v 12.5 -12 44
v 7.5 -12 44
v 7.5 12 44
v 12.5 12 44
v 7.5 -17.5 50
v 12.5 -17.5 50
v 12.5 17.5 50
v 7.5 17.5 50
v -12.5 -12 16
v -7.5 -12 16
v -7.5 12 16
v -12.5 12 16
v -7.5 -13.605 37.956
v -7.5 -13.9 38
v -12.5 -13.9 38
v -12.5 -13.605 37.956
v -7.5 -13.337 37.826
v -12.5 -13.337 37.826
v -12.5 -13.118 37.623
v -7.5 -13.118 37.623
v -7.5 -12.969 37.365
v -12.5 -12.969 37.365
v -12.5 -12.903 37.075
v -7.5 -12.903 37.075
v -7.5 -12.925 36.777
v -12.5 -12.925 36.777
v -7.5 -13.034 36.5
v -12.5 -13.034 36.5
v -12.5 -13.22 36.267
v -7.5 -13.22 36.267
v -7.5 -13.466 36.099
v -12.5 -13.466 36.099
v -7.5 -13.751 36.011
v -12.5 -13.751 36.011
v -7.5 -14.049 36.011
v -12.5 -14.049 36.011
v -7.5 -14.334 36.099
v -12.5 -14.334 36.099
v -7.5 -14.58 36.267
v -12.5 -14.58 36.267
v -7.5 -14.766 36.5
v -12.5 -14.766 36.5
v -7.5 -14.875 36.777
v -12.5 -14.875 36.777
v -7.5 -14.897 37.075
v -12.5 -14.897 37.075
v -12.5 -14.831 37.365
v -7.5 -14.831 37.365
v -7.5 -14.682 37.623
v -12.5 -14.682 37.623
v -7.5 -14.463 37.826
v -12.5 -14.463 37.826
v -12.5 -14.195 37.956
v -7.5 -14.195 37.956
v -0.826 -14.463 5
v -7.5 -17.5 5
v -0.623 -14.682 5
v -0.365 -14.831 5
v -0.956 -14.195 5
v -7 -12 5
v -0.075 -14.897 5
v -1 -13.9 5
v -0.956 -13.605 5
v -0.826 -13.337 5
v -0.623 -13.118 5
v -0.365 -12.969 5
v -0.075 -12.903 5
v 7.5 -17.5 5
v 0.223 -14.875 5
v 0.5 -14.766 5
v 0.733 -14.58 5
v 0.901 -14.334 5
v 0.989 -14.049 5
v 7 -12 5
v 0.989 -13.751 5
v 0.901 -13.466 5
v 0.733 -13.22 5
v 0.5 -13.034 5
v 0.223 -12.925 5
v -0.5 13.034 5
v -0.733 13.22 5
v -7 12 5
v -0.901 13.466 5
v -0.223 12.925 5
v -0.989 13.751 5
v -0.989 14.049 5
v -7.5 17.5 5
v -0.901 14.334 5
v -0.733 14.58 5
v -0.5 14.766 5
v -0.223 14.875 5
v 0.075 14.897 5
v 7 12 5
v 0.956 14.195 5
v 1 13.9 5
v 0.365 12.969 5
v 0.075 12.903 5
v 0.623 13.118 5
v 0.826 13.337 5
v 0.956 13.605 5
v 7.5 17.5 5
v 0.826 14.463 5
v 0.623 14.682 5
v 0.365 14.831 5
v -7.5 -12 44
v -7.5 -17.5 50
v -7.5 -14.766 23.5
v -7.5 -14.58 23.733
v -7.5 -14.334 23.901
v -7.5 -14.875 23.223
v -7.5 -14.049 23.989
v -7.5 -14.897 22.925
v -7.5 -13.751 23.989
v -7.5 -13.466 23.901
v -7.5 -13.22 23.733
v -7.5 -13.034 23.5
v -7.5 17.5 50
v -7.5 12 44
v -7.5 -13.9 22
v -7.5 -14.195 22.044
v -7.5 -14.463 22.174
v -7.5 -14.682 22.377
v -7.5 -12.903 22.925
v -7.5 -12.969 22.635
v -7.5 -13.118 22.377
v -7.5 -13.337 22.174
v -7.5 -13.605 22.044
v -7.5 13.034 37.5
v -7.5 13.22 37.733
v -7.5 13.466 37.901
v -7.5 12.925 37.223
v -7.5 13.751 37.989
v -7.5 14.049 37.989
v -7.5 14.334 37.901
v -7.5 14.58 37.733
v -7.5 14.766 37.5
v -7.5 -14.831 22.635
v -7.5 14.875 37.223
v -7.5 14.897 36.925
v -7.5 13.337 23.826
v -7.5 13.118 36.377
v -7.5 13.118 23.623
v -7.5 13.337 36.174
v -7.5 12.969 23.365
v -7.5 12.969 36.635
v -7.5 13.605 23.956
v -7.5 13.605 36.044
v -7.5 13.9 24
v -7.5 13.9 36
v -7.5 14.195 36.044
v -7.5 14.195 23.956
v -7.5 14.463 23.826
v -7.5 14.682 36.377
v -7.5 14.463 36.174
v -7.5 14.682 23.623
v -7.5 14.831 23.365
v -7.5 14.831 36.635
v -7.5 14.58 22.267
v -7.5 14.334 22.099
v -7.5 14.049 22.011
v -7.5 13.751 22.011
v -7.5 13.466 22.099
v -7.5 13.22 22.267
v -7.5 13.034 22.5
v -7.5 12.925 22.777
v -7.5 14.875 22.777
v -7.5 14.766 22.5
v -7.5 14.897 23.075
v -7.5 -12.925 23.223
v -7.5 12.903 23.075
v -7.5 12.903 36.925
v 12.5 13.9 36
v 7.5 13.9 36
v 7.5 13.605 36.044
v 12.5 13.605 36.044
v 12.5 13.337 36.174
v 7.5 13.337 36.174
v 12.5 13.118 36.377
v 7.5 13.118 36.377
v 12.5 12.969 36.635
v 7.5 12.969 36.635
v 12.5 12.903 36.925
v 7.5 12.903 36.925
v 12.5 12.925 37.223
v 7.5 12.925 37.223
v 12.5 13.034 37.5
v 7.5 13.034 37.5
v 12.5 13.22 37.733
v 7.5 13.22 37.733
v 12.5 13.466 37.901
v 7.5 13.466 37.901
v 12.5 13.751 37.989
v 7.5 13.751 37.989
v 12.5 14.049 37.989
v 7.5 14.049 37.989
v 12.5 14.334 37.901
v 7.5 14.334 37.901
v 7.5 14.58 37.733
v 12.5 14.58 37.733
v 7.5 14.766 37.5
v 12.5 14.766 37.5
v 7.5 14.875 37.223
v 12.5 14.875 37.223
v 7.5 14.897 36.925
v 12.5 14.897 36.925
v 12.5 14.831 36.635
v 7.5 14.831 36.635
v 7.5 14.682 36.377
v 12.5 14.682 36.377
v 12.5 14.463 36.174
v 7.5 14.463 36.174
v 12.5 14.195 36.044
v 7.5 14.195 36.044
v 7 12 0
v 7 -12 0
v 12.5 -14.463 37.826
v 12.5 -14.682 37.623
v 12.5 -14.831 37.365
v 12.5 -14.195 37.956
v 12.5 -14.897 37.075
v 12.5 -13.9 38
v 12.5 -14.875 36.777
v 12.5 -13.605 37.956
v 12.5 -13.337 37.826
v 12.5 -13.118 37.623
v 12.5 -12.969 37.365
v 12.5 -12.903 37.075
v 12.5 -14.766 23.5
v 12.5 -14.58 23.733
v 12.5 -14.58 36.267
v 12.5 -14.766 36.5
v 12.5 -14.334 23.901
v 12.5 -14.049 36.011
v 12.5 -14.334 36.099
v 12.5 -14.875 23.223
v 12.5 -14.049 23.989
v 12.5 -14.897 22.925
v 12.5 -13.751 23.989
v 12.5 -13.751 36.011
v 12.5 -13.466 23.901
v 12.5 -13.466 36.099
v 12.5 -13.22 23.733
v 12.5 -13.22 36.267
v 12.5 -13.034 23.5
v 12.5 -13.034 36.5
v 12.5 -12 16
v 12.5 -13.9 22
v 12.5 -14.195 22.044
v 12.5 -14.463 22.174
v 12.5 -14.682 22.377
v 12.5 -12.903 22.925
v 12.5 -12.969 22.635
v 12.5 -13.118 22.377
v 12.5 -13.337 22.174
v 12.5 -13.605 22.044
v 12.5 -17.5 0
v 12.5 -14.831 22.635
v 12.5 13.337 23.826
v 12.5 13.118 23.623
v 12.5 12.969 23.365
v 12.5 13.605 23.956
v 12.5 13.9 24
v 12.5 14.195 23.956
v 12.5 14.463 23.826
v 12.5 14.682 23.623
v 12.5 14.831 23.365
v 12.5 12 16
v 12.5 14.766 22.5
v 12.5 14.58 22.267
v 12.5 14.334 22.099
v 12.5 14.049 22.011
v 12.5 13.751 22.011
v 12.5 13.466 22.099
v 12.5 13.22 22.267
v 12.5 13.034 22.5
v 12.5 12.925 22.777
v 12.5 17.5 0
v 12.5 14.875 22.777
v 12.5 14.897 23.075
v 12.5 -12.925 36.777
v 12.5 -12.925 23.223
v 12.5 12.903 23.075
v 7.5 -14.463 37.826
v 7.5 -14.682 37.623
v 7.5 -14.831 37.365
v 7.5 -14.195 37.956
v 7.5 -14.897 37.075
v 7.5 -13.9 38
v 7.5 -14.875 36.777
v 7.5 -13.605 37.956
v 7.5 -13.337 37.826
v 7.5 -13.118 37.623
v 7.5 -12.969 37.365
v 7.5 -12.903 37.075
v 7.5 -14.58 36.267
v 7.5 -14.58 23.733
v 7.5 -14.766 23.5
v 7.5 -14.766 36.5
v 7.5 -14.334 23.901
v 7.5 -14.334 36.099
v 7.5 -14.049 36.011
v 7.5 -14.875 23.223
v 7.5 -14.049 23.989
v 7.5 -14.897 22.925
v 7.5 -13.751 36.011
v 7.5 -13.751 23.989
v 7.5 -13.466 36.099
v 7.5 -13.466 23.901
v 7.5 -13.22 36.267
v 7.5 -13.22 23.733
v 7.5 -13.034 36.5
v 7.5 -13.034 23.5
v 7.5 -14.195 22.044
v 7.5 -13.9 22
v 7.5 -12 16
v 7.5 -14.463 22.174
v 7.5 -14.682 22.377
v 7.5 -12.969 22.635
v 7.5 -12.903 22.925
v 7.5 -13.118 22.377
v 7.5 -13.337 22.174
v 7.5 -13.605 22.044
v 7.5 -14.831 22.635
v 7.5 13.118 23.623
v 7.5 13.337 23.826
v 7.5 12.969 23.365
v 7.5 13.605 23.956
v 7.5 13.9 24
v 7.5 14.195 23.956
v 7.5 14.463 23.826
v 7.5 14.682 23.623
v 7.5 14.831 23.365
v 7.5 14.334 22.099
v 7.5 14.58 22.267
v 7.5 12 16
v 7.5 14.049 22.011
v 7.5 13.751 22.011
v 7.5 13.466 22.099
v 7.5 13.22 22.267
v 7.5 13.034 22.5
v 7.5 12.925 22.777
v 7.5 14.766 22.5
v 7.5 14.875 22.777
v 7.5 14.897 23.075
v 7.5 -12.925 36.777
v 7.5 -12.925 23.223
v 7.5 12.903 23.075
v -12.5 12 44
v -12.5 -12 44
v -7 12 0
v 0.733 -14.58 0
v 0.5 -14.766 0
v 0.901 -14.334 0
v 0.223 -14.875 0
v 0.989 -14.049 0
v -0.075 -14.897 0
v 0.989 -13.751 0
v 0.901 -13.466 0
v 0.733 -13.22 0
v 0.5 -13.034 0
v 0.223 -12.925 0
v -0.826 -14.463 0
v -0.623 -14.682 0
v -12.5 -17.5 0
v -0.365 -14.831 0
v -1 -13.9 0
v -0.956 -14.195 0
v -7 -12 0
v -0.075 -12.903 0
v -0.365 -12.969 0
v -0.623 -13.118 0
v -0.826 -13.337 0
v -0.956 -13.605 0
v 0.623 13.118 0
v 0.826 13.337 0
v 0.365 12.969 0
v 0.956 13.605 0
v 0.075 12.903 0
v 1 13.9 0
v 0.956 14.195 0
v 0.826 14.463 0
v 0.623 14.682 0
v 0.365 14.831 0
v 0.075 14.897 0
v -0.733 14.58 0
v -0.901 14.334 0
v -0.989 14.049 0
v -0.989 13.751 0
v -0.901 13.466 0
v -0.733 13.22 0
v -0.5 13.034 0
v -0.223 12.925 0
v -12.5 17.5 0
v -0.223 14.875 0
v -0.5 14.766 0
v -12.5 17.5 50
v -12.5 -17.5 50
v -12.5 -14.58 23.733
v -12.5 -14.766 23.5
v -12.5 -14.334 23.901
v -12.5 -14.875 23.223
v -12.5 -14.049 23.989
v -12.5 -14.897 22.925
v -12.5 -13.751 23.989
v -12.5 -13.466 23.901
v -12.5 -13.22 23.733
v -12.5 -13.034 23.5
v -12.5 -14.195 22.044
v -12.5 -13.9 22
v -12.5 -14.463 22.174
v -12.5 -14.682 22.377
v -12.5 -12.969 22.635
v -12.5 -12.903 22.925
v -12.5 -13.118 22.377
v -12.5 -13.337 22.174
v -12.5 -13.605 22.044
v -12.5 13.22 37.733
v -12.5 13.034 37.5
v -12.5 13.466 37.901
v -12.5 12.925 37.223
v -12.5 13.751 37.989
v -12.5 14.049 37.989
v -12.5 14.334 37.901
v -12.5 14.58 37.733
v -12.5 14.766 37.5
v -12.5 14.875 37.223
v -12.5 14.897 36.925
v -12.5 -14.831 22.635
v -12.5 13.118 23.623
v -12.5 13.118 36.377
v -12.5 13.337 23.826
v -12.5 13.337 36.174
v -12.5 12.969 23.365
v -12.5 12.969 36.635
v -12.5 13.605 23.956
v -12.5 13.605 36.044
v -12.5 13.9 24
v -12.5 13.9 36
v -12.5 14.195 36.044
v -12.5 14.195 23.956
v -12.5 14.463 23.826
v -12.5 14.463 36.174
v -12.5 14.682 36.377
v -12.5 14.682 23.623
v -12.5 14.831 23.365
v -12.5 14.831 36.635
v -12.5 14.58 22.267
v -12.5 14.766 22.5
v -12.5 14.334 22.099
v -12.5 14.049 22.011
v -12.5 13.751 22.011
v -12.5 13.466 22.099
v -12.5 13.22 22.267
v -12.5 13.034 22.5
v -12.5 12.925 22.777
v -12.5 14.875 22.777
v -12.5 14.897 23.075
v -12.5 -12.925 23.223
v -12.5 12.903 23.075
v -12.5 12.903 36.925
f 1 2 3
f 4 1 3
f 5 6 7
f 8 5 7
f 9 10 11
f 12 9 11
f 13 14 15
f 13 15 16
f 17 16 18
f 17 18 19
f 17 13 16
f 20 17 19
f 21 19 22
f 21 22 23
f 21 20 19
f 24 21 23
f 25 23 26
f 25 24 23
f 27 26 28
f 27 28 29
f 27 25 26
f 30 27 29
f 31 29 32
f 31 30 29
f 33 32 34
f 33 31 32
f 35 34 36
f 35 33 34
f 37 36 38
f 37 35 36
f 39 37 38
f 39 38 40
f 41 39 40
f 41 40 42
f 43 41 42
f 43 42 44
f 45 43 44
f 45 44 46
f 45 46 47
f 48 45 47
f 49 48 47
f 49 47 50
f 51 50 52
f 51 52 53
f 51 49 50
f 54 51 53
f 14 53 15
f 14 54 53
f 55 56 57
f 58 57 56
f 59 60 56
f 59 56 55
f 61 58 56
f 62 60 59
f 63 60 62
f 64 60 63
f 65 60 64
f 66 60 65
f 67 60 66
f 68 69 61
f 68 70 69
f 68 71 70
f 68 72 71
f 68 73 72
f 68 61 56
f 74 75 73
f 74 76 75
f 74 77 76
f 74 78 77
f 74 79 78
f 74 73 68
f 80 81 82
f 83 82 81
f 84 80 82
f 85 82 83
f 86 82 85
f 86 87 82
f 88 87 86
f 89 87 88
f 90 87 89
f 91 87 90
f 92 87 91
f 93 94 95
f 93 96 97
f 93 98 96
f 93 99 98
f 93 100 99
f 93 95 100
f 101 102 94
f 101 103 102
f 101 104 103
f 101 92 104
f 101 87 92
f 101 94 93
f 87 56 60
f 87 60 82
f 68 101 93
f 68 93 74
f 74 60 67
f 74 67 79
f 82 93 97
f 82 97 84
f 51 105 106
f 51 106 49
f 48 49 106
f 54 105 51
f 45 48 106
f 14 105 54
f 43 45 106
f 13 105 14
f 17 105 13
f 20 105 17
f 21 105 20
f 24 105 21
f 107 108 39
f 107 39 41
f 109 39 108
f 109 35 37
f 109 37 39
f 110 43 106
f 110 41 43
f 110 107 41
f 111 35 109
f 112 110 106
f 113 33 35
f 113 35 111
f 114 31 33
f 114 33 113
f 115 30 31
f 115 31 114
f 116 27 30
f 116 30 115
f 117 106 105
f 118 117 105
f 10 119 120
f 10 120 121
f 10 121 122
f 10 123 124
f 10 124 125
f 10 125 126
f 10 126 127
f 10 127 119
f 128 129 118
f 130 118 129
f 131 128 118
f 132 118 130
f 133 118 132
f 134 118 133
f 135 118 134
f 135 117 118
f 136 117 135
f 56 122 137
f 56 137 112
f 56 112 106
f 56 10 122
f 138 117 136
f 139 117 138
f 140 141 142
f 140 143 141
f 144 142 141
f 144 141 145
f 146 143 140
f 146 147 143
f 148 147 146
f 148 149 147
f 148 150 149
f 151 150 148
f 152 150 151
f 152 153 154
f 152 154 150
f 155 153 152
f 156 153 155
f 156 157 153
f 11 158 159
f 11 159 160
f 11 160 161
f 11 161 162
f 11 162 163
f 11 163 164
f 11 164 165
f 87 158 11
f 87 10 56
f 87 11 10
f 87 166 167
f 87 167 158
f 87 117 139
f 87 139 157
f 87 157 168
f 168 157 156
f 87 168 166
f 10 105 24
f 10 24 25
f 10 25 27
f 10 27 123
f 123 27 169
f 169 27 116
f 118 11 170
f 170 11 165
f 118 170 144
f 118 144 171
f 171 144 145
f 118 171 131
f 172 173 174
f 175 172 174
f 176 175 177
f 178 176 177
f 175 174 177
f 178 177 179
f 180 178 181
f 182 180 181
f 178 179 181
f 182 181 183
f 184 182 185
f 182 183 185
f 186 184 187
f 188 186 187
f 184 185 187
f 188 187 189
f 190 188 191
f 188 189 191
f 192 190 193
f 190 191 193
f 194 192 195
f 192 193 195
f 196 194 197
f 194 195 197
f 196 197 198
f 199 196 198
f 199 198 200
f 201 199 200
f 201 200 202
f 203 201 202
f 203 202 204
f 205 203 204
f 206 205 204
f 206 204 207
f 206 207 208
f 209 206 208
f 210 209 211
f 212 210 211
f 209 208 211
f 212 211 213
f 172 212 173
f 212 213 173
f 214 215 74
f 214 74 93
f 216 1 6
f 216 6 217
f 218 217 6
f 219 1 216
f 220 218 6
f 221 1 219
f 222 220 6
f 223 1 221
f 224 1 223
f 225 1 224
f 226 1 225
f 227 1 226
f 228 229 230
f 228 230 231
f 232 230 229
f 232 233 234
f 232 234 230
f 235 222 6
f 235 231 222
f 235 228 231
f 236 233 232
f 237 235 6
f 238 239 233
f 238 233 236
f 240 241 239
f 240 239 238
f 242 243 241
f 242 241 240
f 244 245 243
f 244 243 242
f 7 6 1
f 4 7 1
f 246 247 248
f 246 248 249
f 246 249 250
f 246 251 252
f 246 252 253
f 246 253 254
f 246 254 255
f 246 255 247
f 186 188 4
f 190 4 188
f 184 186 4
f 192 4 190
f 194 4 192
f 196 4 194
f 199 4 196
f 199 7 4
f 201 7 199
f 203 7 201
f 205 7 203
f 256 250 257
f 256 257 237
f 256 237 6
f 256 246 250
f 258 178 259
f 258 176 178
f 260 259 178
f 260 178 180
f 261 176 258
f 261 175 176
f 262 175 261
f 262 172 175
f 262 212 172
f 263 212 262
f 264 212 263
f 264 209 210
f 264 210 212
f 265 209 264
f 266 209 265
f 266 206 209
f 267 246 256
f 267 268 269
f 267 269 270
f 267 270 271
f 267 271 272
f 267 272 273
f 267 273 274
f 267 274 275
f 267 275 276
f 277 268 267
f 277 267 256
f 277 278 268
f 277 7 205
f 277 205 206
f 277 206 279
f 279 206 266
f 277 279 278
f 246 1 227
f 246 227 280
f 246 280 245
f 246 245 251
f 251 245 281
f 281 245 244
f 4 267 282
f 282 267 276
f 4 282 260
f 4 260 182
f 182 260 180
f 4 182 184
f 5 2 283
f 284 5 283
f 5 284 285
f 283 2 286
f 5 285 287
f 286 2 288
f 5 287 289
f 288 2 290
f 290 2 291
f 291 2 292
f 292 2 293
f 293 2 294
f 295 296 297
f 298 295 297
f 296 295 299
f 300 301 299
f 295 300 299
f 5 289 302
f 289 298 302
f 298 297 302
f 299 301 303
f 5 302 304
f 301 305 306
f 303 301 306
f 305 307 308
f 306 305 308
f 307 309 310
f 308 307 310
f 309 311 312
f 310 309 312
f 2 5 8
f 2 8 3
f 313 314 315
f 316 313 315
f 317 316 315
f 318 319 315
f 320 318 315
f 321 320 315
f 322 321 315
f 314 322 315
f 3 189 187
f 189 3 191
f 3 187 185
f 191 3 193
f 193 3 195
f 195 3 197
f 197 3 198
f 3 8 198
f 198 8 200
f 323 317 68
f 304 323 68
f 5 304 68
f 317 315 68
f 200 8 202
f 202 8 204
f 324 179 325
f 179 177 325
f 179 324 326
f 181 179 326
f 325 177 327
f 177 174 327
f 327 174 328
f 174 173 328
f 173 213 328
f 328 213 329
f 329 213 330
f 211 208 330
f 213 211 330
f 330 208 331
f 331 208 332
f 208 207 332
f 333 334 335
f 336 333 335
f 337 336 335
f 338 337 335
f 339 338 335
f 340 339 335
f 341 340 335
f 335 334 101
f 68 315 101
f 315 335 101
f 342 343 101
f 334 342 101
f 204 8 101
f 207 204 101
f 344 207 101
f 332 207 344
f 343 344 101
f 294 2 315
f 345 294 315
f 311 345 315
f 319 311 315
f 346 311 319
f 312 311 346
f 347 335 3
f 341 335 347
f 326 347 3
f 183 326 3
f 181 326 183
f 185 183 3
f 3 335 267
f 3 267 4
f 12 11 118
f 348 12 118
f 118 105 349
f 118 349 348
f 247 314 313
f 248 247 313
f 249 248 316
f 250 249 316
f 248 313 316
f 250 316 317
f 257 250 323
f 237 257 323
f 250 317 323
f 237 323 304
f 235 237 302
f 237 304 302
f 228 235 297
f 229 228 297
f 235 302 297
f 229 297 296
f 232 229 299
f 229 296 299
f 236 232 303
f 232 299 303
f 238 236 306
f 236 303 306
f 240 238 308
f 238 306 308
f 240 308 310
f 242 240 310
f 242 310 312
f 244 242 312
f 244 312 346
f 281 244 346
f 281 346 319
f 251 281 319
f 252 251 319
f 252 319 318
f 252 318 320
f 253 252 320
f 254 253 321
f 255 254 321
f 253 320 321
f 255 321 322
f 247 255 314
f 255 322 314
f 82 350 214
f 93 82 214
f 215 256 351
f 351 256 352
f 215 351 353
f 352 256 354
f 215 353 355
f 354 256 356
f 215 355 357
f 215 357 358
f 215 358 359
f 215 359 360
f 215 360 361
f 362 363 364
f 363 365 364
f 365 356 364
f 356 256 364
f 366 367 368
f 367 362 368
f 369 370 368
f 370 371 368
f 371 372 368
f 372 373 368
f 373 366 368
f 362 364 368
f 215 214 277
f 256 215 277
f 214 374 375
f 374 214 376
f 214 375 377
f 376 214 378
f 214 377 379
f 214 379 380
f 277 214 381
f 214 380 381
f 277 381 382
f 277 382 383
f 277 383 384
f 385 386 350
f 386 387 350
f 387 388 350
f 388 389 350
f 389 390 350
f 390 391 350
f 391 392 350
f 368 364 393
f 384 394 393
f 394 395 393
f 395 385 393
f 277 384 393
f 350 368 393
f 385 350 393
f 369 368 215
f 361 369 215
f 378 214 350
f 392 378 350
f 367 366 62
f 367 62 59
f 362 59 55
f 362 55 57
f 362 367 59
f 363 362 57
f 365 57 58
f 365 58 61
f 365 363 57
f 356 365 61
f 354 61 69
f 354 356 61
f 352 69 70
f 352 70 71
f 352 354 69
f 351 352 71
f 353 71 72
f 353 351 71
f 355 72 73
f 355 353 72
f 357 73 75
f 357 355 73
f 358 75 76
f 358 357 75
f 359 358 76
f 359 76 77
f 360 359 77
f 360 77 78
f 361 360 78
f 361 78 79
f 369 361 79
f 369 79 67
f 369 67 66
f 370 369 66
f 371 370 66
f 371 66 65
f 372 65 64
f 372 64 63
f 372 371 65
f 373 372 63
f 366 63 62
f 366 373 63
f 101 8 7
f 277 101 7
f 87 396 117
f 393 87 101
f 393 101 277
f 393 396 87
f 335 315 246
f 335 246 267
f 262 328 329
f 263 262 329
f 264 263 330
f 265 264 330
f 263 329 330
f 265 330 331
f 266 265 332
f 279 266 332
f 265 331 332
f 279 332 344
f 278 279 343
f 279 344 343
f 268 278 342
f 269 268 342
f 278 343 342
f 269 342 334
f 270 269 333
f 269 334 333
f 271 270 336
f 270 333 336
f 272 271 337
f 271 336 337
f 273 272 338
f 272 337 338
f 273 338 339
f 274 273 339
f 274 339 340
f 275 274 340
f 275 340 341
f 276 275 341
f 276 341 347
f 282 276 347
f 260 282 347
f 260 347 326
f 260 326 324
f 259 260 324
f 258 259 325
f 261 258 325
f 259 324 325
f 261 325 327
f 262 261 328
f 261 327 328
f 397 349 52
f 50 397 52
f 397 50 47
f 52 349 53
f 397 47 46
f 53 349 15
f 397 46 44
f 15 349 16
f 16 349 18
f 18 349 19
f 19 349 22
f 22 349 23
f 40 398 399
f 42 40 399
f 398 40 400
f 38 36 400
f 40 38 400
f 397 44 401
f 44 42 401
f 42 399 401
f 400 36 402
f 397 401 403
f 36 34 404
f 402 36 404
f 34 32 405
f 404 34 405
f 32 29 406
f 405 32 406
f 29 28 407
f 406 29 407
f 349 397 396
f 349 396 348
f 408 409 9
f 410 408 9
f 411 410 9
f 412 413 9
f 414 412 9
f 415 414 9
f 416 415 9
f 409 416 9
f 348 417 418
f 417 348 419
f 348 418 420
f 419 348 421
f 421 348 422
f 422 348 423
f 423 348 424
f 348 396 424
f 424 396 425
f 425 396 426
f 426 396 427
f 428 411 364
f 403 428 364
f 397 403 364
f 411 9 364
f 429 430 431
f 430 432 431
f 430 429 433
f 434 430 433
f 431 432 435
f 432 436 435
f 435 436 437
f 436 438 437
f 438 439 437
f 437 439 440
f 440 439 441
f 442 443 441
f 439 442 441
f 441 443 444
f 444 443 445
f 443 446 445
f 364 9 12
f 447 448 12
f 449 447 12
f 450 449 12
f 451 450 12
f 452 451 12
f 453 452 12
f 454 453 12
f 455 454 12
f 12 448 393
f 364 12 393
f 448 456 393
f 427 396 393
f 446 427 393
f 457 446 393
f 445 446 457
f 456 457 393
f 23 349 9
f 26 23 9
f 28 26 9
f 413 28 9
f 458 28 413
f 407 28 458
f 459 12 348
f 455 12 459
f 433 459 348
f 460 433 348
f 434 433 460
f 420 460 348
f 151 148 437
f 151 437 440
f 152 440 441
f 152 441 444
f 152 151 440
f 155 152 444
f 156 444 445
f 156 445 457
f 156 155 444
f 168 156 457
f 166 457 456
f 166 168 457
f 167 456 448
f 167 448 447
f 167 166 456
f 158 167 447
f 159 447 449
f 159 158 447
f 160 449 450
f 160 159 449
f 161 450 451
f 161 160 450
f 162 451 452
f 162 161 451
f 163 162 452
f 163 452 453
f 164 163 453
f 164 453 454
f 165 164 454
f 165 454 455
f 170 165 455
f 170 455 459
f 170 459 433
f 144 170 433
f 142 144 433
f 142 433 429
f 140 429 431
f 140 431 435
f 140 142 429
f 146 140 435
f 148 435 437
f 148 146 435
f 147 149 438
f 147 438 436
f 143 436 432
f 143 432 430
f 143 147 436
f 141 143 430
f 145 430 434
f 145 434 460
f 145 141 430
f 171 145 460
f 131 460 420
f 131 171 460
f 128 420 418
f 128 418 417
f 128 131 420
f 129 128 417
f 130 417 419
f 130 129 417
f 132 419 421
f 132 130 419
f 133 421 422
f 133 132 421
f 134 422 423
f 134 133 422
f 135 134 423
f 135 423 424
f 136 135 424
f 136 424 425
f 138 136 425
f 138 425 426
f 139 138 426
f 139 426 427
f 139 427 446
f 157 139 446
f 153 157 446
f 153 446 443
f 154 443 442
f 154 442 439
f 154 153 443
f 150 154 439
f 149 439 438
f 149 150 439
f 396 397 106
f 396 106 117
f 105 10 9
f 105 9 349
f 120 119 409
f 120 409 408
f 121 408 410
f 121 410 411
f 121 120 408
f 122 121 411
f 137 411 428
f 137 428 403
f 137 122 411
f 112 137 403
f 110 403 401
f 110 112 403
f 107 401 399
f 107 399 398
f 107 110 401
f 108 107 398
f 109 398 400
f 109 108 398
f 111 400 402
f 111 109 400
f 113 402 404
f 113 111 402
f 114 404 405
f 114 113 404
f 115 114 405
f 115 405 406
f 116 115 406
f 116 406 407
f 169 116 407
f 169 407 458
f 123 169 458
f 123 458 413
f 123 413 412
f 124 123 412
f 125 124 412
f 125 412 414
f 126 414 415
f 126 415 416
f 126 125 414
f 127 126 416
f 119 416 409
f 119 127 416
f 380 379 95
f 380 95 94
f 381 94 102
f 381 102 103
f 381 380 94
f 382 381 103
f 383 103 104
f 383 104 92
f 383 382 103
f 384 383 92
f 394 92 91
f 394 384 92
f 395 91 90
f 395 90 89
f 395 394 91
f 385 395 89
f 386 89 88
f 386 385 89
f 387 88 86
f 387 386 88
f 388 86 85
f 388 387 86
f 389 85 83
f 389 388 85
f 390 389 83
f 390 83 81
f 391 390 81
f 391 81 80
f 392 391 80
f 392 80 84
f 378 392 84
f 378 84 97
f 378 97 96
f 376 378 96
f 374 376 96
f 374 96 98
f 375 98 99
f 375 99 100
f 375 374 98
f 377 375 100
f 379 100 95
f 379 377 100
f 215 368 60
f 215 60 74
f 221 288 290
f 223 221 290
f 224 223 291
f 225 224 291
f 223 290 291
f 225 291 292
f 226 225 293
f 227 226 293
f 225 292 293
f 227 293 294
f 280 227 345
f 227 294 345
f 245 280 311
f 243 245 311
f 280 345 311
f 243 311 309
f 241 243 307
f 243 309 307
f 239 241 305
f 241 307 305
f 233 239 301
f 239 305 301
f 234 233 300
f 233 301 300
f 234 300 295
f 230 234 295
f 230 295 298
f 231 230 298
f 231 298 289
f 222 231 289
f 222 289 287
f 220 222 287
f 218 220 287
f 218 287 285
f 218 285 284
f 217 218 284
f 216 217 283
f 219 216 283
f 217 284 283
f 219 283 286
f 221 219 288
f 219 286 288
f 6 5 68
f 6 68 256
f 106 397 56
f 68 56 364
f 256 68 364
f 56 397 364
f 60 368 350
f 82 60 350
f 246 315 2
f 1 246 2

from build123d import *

# Parameters (mm, degrees)
SKETCH1_W           = 20
SKETCH1_H           = 35
SKETCH1_R           = 1
SKETCH1_W_2         = 14
SKETCH1_H_2         = 24
BOSS_EXTRUDE1_DEPTH = 5
SKETCH2_W           = 50
SKETCH2_H           = 35
BOSS_EXTRUDE2_DEPTH = 2.5
SKETCH3_R           = 1
SKETCH3_W           = 28
SKETCH3_H           = 24
CUT_EXTRUDE1_DEPTH  = 5


with BuildPart() as part:
    # Sketch1 → Boss-Extrude1 (new body)
    with BuildSketch(Plane.XY):
        Rectangle(SKETCH1_W, SKETCH1_H)
        with Locations((0, 13.9)):
            Circle(SKETCH1_R, mode=Mode.SUBTRACT)
        with Locations(Location((0, -13.9, 0), (0, 0, 180))):
            Circle(SKETCH1_R, mode=Mode.SUBTRACT)
        Rectangle(SKETCH1_W_2, SKETCH1_H_2, mode=Mode.SUBTRACT)
    extrude(amount=BOSS_EXTRUDE1_DEPTH)

    # Sketch2 → Boss-Extrude2 (add, symmetric)
    with BuildSketch(Plane(origin=(10, 0, 0), x_dir=(0, 0, -1), z_dir=(1, 0, 0))):
        with Locations((-25, 0)):
            Rectangle(SKETCH2_W, SKETCH2_H)
    boss_extrude2 = extrude(amount=BOSS_EXTRUDE2_DEPTH, both=True)

    # Sketch3 → Cut-Extrude1 (cut)
    with BuildSketch(Plane.ZY.offset(-7.5)):
        with Locations((23, 13.9)):
            Circle(SKETCH3_R)
        with Locations(Location((37, 13.9, 0), (0, 0, 180))):
            Circle(SKETCH3_R)
        with Locations((37, -13.9)):
            Circle(SKETCH3_R)
        with Locations(Location((23, -13.9, 0), (0, 0, 180))):
            Circle(SKETCH3_R)
        with Locations((30, 0)):
            Rectangle(SKETCH3_W, SKETCH3_H)
    cut_extrude1 = extrude(amount=-CUT_EXTRUDE1_DEPTH, mode=Mode.SUBTRACT)

    # Mirror2: Boss-Extrude2, Cut-Extrude1 across plane
    add(boss_extrude2.mirror(Plane.ZY))
    add(cut_extrude1.mirror(Plane.ZY), mode=Mode.SUBTRACT)


solid = part.part
